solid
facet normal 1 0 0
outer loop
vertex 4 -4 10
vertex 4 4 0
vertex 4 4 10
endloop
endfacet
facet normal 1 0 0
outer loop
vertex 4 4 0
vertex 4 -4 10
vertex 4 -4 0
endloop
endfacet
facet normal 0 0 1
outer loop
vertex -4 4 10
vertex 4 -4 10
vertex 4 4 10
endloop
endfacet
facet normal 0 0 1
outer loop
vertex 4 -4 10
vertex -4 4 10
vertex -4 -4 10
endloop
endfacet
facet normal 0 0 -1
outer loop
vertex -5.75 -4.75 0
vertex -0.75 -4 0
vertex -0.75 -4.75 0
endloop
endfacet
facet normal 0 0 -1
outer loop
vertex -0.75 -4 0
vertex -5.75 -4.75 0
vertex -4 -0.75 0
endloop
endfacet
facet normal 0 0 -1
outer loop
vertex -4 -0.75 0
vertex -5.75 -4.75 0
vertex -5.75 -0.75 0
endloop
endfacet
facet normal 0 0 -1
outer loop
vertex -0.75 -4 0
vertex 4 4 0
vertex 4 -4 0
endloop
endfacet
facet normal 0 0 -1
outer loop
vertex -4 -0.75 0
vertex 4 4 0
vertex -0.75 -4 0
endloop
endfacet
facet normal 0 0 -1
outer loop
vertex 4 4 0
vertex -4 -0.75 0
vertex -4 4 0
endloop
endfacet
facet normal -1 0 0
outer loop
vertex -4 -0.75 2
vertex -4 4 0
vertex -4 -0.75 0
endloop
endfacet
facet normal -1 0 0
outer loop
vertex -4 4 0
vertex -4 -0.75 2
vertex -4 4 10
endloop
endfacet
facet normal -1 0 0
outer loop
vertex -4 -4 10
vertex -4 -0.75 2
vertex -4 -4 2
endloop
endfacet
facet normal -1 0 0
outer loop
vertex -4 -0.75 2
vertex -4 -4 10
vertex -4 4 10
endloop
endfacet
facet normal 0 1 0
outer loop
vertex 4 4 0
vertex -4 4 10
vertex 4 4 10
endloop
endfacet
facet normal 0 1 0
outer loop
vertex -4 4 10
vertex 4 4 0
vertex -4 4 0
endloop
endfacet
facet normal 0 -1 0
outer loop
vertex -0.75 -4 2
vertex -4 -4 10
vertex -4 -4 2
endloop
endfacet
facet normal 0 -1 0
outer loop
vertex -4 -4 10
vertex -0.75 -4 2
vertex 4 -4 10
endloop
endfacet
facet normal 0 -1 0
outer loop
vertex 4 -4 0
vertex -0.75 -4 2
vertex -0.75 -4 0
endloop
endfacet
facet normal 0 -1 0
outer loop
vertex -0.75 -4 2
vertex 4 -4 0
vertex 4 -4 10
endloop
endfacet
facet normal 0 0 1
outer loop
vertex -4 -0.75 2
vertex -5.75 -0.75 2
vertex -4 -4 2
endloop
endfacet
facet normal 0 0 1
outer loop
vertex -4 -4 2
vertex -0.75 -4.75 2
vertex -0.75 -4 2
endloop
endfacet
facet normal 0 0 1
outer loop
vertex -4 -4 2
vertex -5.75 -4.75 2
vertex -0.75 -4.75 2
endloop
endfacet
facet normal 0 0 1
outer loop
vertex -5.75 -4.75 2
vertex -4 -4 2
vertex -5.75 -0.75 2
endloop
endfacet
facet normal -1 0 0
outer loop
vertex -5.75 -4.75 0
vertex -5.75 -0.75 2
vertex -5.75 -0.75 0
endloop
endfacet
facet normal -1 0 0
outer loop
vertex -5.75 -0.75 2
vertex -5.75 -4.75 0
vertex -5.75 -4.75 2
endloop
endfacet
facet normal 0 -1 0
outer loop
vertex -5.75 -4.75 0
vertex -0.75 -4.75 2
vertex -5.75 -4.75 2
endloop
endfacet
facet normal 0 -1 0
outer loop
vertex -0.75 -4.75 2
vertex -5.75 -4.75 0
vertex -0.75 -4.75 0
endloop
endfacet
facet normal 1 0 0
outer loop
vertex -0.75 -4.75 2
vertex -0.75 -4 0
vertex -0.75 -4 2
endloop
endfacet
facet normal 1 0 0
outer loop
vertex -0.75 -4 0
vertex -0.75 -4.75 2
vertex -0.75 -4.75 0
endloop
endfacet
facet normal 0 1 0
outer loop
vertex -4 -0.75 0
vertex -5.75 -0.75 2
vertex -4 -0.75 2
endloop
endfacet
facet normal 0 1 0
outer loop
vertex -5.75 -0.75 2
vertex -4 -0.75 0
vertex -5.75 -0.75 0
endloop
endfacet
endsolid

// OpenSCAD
translate([0, 0, 5]) color([0,1,0,0.9]) cube([8, 8, 10], center=true);
translate([-5.5, -4.5, 1]) color([1,0,0]) cube([0.5, 0.5, 2], center=true);
translate([-5.0, -4.5, 1]) color([1,0,0]) cube([0.5, 0.5, 2], center=true);
translate([-4.5, -4.5, 1]) color([1,0,0]) cube([0.5, 0.5, 2], center=true);
translate([-4.0, -4.5, 1]) color([1,0,0]) cube([0.5, 0.5, 2], center=true);
translate([-3.5, -4.5, 1]) color([1,0,0]) cube([0.5, 0.5, 2], center=true);
translate([-3.0, -4.5, 1]) color([1,0,0]) cube([0.5, 0.5, 2], center=true);
translate([-2.5, -4.5, 1]) color([1,0,0]) cube([0.5, 0.5, 2], center=true);
translate([-2.0, -4.5, 1]) color([1,0,0]) cube([0.5, 0.5, 2], center=true);
translate([-1.5, -4.5, 1]) color([1,0,0]) cube([0.5, 0.5, 2], center=true);
translate([-1.0, -4.5, 1]) color([1,0,0]) cube([0.5, 0.5, 2], center=true);
translate([-5.5, -4.0, 1]) color([1,0,0]) cube([0.5, 0.5, 2], center=true);
translate([-5.0, -4.0, 1]) color([1,0,0]) cube([0.5, 0.5, 2], center=true);
translate([-4.5, -4.0, 1]) color([1,0,0]) cube([0.5, 0.5, 2], center=true);
translate([-4.0, -4.0, 1]) color([1,0,0]) cube([0.5, 0.5, 2], center=true);
translate([-3.5, -4.0, 1]) color([1,0,0]) cube([0.5, 0.5, 2], center=true);
translate([-3.0, -4.0, 1]) color([1,0,0]) cube([0.5, 0.5, 2], center=true);
translate([-2.5, -4.0, 1]) color([1,0,0]) cube([0.5, 0.5, 2], center=true);
translate([-2.0, -4.0, 1]) color([1,0,0]) cube([0.5, 0.5, 2], center=true);
translate([-1.5, -4.0, 1]) color([1,0,0]) cube([0.5, 0.5, 2], center=true);
translate([-1.0, -4.0, 1]) color([1,0,0]) cube([0.5, 0.5, 2], center=true);
translate([-5.5, -3.5, 1]) color([1,0,0]) cube([0.5, 0.5, 2], center=true);
translate([-5.0, -3.5, 1]) color([1,0,0]) cube([0.5, 0.5, 2], center=true);
translate([-4.5, -3.5, 1]) color([1,0,0]) cube([0.5, 0.5, 2], center=true);
translate([-4.0, -3.5, 1]) color([1,0,0]) cube([0.5, 0.5, 2], center=true);
translate([-3.5, -3.5, 1]) color([1,0,0]) cube([0.5, 0.5, 2], center=true);
translate([-3.0, -3.5, 1]) color([1,0,0]) cube([0.5, 0.5, 2], center=true);
translate([-2.5, -3.5, 1]) color([1,0,0]) cube([0.5, 0.5, 2], center=true);
translate([-2.0, -3.5, 1]) color([1,0,0]) cube([0.5, 0.5, 2], center=true);
translate([-1.5, -3.5, 1]) color([1,0,0]) cube([0.5, 0.5, 2], center=true);
translate([-1.0, -3.5, 1]) color([1,0,0]) cube([0.5, 0.5, 2], center=true);
translate([-5.5, -3.0, 1]) color([1,0,0]) cube([0.5, 0.5, 2], center=true);
translate([-5.0, -3.0, 1]) color([1,0,0]) cube([0.5, 0.5, 2], center=true);
translate([-4.5, -3.0, 1]) color([1,0,0]) cube([0.5, 0.5, 2], center=true);
translate([-4.0, -3.0, 1]) color([1,0,0]) cube([0.5, 0.5, 2], center=true);
translate([-3.5, -3.0, 1]) color([1,0,0]) cube([0.5, 0.5, 2], center=true);
translate([-3.0, -3.0, 1]) color([1,0,0]) cube([0.5, 0.5, 2], center=true);
translate([-2.5, -3.0, 1]) color([1,0,0]) cube([0.5, 0.5, 2], center=true);
translate([-2.0, -3.0, 1]) color([1,0,0]) cube([0.5, 0.5, 2], center=true);
translate([-1.5, -3.0, 1]) color([1,0,0]) cube([0.5, 0.5, 2], center=true);
translate([-1.0, -3.0, 1]) color([1,0,0]) cube([0.5, 0.5, 2], center=true);
translate([-5.5, -2.5, 1]) color([1,0,0]) cube([0.5, 0.5, 2], center=true);
translate([-5.0, -2.5, 1]) color([1,0,0]) cube([0.5, 0.5, 2], center=true);
translate([-4.5, -2.5, 1]) color([1,0,0]) cube([0.5, 0.5, 2], center=true);
translate([-4.0, -2.5, 1]) color([1,0,0]) cube([0.5, 0.5, 2], center=true);
translate([-3.5, -2.5, 1]) color([1,0,0]) cube([0.5, 0.5, 2], center=true);
translate([-3.0, -2.5, 1]) color([1,0,0]) cube([0.5, 0.5, 2], center=true);
translate([-2.5, -2.5, 1]) color([1,0,0]) cube([0.5, 0.5, 2], center=true);
translate([-2.0, -2.5, 1]) color([1,0,0]) cube([0.5, 0.5, 2], center=true);
translate([-1.5, -2.5, 1]) color([1,0,0]) cube([0.5, 0.5, 2], center=true);
translate([-1.0, -2.5, 1]) color([1,0,0]) cube([0.5, 0.5, 2], center=true);
translate([-5.5, -2.0, 1]) color([1,0,0]) cube([0.5, 0.5, 2], center=true);
translate([-5.0, -2.0, 1]) color([1,0,0]) cube([0.5, 0.5, 2], center=true);
translate([-4.5, -2.0, 1]) color([1,0,0]) cube([0.5, 0.5, 2], center=true);
translate([-4.0, -2.0, 1]) color([1,0,0]) cube([0.5, 0.5, 2], center=true);
translate([-3.5, -2.0, 1]) color([1,0,0]) cube([0.5, 0.5, 2], center=true);
translate([-3.0, -2.0, 1]) color([1,0,0]) cube([0.5, 0.5, 2], center=true);
translate([-2.5, -2.0, 1]) color([1,0,0]) cube([0.5, 0.5, 2], center=true);
translate([-2.0, -2.0, 1]) color([1,0,0]) cube([0.5, 0.5, 2], center=true);
translate([-1.5, -2.0, 1]) color([1,0,0]) cube([0.5, 0.5, 2], center=true);
translate([-1.0, -2.0, 1]) color([1,0,0]) cube([0.5, 0.5, 2], center=true);
translate([-5.5, -1.5, 1]) color([1,0,0]) cube([0.5, 0.5, 2], center=true);
translate([-5.0, -1.5, 1]) color([1,0,0]) cube([0.5, 0.5, 2], center=true);
translate([-4.5, -1.5, 1]) color([1,0,0]) cube([0.5, 0.5, 2], center=true);
translate([-4.0, -1.5, 1]) color([1,0,0]) cube([0.5, 0.5, 2], center=true);
translate([-3.5, -1.5, 1]) color([1,0,0]) cube([0.5, 0.5, 2], center=true);
translate([-3.0, -1.5, 1]) color([1,0,0]) cube([0.5, 0.5, 2], center=true);
translate([-2.5, -1.5, 1]) color([1,0,0]) cube([0.5, 0.5, 2], center=true);
translate([-2.0, -1.5, 1]) color([1,0,0]) cube([0.5, 0.5, 2], center=true);
translate([-1.5, -1.5, 1]) color([1,0,0]) cube([0.5, 0.5, 2], center=true);
translate([-1.0, -1.5, 1]) color([1,0,0]) cube([0.5, 0.5, 2], center=true);
translate([-5.5, -1.0, 1]) color([1,0,0]) cube([0.5, 0.5, 2], center=true);
translate([-5.0, -1.0, 1]) color([1,0,0]) cube([0.5, 0.5, 2], center=true);
translate([-4.5, -1.0, 1]) color([1,0,0]) cube([0.5, 0.5, 2], center=true);
translate([-4.0, -1.0, 1]) color([1,0,0]) cube([0.5, 0.5, 2], center=true);
translate([-3.5, -1.0, 1]) color([1,0,0]) cube([0.5, 0.5, 2], center=true);
translate([-3.0, -1.0, 1]) color([1,0,0]) cube([0.5, 0.5, 2], center=true);
translate([-2.5, -1.0, 1]) color([1,0,0]) cube([0.5, 0.5, 2], center=true);
translate([-2.0, -1.0, 1]) color([1,0,0]) cube([0.5, 0.5, 2], center=true);
translate([-1.5, -1.0, 1]) color([1,0,0]) cube([0.5, 0.5, 2], center=true);
translate([-1.0, -1.0, 1]) color([1,0,0]) cube([0.5, 0.5, 2], center=true);
